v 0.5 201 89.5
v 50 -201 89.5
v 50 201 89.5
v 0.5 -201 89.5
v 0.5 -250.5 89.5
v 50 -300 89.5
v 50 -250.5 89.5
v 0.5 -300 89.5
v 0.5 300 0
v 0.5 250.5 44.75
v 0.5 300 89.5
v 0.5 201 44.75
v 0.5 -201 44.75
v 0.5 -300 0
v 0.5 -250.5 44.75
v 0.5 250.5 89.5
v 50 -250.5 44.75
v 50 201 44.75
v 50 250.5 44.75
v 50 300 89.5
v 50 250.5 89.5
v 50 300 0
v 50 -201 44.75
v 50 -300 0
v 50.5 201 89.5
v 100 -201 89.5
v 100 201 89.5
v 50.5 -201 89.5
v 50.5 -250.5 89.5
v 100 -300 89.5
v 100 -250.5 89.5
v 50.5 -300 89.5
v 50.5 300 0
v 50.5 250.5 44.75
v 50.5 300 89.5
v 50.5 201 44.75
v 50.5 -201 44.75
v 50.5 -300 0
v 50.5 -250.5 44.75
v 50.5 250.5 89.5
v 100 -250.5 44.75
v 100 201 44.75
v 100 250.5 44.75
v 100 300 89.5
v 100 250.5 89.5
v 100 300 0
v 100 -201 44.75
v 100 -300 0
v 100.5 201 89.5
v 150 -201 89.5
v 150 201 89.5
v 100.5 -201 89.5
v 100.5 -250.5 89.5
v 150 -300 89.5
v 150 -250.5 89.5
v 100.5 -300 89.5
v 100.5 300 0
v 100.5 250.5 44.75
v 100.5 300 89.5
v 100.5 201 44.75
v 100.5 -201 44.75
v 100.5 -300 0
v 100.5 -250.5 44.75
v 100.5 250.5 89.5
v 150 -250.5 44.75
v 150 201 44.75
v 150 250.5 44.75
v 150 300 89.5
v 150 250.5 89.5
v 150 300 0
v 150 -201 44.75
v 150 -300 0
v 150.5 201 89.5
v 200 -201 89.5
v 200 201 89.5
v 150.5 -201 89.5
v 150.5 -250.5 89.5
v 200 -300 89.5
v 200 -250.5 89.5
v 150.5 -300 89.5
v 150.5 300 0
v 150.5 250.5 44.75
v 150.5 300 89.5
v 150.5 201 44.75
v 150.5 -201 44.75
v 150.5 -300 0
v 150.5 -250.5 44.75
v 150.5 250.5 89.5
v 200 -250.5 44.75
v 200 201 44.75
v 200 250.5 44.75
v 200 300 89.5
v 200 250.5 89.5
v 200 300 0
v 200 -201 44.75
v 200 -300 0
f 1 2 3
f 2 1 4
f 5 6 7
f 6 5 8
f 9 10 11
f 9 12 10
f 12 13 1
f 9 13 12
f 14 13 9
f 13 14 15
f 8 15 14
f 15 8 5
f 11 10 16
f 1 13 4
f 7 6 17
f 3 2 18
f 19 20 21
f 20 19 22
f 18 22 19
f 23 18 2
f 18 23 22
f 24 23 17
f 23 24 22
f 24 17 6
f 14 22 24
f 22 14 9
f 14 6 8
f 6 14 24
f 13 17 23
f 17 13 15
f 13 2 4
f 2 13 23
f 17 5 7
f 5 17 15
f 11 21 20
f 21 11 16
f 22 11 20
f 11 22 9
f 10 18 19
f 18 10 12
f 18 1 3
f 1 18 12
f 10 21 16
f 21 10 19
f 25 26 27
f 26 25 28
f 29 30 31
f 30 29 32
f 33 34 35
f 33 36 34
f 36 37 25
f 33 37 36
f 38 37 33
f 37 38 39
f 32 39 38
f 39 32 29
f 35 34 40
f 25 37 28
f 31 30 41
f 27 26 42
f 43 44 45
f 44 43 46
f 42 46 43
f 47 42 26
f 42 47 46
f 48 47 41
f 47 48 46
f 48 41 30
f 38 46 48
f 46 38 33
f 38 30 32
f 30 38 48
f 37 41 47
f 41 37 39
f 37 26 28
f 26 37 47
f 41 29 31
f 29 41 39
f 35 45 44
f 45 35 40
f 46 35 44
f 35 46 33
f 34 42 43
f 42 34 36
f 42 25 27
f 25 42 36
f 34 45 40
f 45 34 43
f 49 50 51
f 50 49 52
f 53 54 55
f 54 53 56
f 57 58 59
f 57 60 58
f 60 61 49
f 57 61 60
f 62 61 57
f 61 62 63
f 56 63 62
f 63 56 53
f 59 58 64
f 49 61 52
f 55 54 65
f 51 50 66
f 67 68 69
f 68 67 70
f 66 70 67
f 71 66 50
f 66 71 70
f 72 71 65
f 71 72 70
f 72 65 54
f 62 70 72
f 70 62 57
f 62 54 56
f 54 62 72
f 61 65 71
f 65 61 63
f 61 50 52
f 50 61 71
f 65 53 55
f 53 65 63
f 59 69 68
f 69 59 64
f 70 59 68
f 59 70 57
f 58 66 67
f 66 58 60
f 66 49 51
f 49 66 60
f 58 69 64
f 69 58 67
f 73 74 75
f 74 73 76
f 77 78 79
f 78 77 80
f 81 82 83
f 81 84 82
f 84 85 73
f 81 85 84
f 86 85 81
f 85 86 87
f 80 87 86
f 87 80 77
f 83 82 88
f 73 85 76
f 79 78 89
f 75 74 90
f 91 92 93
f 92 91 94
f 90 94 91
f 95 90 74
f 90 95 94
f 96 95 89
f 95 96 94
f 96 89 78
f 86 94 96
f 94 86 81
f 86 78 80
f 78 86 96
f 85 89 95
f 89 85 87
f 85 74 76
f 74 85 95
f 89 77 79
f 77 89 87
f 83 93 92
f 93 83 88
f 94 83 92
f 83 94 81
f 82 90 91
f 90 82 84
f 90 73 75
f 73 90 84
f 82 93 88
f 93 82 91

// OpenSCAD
// file: ../extensions/easy_movement.scad
// Backward (+y axis)
module bw(distance) {
  translate([0, distance, 0]) children();
}

// Forward (-y axis)
module fw(distance) {
  bw(-distance) children();
}

// Right (+x axis)
module rg(distance) {
  translate([distance, 0, 0]) children();
}

// Left (-x axis)
module lf(distance) {
  rg(-distance) children();
}

// Up (+z axis)
module up(distance) {
  translate([0, 0, distance]) children();
}

// Down (-z axis)
module dn(distance) {
  up(-distance) children();
}

// Centered square
module sqr(width, depth) {
  square([width, depth], center=true);
}
// main file
use <../extensions/easy_movement.scad>

width = 89.5;
height = 49.5;
depth = 600;

module cutter() {
  translate([1/2 * width, height, - 1])
    cube([width, height, height + 2]);
}

module half_lap_1() {
  fw(1/2 * depth)
  rotate([0, -90, 0])
    difference() {
      cube([width, 1/2 * depth, height]);
      cutter();
    }
}

module half_lap() {
  half_lap_1();
  mirror([0, 1, 0]) half_lap_1();
}

for (i = [1:4])
  rg(i * height + i * 0.5) half_lap();
